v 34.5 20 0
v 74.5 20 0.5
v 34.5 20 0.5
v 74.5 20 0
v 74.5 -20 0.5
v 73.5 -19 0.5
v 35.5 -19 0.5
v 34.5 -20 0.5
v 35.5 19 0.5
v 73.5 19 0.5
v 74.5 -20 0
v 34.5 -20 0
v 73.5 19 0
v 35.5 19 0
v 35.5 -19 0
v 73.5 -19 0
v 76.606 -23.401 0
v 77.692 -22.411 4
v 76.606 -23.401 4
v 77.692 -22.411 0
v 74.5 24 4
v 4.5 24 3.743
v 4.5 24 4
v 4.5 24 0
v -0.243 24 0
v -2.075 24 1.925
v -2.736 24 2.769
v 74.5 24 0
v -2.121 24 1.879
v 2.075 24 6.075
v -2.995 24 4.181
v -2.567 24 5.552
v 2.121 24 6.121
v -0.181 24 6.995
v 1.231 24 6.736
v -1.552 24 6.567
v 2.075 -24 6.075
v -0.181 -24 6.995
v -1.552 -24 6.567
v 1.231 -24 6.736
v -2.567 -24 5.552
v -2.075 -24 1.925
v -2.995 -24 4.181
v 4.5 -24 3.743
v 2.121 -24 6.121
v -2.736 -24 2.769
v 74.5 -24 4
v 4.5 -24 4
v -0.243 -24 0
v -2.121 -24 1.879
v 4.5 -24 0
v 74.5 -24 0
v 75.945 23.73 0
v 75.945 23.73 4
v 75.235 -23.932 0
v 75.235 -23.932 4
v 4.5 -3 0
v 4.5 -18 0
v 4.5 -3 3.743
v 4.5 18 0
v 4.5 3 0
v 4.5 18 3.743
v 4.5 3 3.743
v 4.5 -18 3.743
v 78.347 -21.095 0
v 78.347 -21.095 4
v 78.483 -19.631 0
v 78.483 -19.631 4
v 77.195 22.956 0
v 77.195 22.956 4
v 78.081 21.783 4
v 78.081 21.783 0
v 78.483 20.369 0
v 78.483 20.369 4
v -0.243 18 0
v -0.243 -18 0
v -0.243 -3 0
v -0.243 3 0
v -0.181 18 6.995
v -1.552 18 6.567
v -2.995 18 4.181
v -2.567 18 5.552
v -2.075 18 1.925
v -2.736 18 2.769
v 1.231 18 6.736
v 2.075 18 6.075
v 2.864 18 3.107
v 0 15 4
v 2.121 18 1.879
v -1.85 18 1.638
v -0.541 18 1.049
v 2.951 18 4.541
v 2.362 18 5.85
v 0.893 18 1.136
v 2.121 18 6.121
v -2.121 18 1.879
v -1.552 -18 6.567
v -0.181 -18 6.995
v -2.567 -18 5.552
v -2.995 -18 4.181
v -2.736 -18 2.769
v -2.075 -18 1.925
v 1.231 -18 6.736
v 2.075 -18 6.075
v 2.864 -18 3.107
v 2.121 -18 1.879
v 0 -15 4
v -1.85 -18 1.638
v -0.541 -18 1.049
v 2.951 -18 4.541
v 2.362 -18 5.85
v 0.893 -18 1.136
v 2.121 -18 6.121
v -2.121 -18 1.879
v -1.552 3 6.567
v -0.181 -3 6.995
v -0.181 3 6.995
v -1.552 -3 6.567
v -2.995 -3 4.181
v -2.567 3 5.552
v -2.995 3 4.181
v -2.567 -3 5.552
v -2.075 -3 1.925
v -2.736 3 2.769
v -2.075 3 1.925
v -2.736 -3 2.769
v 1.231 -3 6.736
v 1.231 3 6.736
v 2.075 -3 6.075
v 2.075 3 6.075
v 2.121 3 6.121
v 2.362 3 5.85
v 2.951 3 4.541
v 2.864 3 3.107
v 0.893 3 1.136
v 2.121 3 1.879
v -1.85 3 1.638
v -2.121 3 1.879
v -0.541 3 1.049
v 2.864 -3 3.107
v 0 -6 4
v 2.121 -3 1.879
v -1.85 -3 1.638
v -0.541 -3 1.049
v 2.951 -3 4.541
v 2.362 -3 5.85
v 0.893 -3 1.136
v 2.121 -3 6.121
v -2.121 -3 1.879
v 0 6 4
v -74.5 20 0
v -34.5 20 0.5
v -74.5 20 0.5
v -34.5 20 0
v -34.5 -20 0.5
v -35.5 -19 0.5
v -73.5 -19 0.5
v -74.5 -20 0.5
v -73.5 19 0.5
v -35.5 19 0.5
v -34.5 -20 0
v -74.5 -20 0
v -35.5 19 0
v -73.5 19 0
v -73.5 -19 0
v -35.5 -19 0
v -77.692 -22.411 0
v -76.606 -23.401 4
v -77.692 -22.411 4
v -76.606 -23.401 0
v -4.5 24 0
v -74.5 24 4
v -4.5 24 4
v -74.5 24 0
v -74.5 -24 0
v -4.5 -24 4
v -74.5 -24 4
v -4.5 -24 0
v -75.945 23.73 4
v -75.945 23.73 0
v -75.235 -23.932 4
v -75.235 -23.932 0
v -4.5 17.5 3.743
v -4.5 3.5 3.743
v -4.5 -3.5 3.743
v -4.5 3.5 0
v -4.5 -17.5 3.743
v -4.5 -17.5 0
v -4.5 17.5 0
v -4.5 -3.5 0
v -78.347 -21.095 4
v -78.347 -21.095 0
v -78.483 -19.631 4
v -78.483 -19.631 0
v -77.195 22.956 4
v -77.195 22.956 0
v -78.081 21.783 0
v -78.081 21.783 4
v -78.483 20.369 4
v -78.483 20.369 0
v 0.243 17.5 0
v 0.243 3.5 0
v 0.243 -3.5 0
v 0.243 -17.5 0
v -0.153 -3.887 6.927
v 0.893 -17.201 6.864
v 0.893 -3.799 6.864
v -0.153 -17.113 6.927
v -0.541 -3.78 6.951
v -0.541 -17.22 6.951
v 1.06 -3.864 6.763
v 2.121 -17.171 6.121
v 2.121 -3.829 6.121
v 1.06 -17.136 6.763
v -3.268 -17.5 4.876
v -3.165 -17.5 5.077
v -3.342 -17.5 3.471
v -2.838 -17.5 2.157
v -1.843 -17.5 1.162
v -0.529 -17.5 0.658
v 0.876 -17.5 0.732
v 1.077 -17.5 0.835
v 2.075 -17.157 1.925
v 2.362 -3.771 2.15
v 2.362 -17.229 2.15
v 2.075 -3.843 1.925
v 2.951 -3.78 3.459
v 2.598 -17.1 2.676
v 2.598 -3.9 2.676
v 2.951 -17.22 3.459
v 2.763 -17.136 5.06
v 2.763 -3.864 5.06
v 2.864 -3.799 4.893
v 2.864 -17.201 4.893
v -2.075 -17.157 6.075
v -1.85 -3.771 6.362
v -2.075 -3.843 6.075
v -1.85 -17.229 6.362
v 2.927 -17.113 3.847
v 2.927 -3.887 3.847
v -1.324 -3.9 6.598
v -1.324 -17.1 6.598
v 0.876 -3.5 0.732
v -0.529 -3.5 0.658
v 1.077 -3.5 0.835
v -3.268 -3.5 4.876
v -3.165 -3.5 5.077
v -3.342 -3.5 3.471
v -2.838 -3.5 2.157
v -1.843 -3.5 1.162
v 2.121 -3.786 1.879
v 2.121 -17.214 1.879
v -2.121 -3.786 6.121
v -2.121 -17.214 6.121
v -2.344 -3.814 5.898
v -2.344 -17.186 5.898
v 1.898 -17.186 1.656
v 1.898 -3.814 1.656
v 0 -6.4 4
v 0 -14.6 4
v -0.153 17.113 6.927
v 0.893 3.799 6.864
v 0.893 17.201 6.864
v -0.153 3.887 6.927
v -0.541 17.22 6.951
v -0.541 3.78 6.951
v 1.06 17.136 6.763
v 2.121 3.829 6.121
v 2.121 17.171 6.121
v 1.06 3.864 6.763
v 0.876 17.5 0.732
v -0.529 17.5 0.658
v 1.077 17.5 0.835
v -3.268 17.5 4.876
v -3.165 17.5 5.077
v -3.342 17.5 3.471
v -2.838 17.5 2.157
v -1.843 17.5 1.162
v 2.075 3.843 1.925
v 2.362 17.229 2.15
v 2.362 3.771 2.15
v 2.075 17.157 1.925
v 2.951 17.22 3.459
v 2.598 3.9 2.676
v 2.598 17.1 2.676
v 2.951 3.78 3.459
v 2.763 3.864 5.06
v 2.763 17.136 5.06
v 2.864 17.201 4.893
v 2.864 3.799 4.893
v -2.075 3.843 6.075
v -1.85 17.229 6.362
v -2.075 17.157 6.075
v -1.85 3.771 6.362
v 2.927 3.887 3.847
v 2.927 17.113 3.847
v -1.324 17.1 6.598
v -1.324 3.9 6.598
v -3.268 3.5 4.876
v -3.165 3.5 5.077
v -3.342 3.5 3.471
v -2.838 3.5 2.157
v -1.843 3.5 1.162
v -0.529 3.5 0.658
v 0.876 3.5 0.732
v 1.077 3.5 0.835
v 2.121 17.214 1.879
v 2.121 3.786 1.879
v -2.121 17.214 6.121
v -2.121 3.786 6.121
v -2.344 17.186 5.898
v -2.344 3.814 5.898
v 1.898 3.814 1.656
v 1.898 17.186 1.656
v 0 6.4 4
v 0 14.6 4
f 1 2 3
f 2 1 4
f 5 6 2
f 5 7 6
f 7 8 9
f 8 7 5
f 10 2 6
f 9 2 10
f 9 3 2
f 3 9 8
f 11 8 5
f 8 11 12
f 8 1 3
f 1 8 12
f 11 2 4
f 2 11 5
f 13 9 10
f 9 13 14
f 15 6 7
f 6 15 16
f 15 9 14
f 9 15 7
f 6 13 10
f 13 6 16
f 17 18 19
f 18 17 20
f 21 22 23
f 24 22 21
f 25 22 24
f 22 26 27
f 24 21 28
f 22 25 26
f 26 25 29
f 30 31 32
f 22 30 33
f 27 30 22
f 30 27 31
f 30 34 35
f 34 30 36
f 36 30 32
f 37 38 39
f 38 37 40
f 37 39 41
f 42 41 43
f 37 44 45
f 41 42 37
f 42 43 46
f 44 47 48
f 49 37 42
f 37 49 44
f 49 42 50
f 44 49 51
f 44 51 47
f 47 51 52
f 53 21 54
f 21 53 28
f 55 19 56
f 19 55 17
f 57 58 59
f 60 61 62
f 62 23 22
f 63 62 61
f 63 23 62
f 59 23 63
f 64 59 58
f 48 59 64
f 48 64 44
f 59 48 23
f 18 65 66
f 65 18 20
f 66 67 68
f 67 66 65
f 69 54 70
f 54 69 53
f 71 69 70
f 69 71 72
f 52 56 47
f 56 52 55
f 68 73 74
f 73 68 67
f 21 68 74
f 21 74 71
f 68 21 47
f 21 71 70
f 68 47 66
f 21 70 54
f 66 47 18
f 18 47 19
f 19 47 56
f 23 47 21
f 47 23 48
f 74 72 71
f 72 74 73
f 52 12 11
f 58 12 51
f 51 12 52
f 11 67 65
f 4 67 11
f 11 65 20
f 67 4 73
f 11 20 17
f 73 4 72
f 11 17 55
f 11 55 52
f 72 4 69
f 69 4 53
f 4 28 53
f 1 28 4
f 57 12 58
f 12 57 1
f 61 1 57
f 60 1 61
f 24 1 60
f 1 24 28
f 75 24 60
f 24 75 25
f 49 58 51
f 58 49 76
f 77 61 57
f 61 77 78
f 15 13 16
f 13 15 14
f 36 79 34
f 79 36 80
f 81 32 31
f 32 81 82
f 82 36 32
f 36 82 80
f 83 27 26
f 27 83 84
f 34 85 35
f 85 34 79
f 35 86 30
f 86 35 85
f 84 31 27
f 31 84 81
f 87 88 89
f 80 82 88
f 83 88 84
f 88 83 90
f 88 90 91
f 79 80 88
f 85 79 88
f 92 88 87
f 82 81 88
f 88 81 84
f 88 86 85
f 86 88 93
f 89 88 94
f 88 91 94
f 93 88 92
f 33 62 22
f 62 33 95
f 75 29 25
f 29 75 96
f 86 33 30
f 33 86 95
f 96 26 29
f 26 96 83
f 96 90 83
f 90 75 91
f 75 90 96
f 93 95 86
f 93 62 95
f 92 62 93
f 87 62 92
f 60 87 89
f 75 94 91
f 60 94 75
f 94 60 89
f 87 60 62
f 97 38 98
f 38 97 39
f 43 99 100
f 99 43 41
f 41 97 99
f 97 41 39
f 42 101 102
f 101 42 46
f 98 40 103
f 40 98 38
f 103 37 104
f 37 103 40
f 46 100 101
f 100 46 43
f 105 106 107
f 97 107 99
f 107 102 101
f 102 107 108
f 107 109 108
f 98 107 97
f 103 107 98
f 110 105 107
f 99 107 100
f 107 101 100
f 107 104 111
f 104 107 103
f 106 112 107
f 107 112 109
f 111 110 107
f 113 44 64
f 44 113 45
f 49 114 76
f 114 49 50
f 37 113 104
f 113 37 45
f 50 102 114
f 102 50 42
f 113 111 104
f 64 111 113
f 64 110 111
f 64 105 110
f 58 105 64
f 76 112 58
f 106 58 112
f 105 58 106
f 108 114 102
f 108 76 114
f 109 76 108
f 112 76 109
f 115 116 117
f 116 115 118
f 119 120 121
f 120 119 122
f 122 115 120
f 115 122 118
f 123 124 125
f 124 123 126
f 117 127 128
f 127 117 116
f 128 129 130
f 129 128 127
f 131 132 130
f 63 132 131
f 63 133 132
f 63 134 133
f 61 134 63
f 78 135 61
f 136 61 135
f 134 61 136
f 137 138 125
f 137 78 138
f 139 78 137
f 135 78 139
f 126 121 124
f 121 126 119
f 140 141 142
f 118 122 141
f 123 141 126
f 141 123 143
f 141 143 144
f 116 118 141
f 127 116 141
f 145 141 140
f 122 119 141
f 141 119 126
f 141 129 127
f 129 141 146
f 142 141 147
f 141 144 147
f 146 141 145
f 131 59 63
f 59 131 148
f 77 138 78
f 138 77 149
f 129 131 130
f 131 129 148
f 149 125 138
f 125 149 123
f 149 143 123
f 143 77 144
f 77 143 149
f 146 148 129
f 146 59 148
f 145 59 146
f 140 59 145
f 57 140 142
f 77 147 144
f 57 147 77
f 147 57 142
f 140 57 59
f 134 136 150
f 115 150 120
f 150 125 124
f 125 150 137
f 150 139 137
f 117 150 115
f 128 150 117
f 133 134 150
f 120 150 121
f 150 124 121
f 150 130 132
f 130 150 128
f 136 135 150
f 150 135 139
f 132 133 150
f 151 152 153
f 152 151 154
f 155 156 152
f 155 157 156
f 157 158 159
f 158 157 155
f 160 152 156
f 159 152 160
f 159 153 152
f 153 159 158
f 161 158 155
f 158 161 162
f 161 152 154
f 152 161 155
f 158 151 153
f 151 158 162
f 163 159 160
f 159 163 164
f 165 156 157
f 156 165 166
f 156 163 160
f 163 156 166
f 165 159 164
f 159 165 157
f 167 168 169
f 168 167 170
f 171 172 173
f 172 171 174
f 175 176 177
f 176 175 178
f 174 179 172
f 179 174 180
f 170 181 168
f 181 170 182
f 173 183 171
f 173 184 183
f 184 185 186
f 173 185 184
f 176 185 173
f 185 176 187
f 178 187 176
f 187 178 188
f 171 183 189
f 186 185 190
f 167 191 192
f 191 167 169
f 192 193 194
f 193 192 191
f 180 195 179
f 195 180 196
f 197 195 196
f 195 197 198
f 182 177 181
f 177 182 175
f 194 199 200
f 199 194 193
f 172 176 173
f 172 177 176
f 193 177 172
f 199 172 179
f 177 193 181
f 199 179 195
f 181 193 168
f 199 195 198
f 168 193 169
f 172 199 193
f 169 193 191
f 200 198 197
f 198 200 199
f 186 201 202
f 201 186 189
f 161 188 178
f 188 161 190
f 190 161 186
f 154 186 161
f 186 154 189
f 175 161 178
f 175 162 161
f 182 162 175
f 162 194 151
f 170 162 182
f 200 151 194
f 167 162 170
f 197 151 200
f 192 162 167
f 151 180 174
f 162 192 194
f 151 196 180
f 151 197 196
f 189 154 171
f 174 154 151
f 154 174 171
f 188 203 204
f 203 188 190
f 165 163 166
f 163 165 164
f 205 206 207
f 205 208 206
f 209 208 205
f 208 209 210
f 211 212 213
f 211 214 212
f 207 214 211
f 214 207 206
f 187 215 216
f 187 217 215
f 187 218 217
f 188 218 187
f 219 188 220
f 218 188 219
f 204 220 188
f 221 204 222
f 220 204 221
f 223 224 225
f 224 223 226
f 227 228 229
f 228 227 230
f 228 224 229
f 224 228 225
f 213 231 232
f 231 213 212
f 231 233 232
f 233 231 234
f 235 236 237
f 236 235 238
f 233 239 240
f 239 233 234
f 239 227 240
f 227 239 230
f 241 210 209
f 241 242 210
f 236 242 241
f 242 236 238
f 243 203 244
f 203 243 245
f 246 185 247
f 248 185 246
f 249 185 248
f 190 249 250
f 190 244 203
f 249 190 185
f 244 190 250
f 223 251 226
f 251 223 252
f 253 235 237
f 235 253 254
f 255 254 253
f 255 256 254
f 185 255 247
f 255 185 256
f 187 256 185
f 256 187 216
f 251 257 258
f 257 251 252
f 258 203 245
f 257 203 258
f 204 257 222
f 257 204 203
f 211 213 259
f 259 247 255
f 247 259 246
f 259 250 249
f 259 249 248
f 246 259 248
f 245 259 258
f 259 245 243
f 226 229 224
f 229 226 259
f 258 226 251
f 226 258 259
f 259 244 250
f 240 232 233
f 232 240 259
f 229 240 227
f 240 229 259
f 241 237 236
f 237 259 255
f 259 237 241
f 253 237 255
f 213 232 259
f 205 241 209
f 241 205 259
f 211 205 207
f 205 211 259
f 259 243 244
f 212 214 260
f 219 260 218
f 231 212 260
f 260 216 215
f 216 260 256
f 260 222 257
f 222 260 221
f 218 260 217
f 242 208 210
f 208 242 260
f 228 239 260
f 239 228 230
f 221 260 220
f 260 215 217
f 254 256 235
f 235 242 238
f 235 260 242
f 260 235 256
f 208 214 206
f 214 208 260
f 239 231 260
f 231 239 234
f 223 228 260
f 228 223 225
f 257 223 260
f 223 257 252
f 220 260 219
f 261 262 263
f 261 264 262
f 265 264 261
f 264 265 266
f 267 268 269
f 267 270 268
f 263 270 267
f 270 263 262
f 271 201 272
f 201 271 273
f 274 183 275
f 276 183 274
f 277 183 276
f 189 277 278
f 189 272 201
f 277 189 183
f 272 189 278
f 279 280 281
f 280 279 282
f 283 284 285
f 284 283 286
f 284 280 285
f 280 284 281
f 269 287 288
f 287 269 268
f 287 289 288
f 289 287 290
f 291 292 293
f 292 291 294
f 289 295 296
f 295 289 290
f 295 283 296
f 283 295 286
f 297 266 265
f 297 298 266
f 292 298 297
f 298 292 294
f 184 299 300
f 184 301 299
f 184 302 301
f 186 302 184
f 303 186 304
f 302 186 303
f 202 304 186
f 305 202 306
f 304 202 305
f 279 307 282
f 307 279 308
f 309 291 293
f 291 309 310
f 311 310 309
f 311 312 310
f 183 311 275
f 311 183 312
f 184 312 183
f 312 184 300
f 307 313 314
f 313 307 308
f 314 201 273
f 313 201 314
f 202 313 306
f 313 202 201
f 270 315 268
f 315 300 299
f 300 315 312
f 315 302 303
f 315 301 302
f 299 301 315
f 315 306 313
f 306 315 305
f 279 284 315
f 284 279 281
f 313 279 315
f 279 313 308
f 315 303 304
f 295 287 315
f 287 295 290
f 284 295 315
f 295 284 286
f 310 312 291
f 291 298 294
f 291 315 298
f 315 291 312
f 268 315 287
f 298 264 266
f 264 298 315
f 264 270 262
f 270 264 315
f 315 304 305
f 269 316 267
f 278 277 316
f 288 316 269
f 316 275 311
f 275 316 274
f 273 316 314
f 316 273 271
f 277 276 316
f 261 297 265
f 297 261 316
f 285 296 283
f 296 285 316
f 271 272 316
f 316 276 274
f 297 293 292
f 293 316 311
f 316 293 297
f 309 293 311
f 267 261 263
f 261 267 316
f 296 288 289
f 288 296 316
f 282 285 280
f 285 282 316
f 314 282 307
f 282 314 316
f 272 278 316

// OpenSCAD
// preview[view:south, tilt:top]

/* [Global] */

// Load a 150x150 pixel image.(images will be stretched to fit) Simple, high contrast images work best. Make sure to click the Invert Colors checkbox!
image_file = "smile.dat"; // [image_surface:150x150]

// Where would you like the hinge in relation to your image?
hinge_placement = 1; // [1:top,2:left,3:bottom,4:right]

// What height would you like for the embossed area (mm)?
emboss_height = 1.5;

// How thick should the handle be (mm)?
handle_thickness = 2.5;

// How long should the handle be (mm, not less than 45)?
handle_length = 70;

/* [Hidden] */
$fa = 6;
$fs = 1.5;
image_width = 40;
image_length = 40;
image_padding = 4;

handle_width = image_width + image_padding*2;
handle_height = emboss_height+handle_thickness;
nub = 3; // hinge size
tol = 0.5; // spacing between hinge pieces

assembly();

module assembly() {
    stamp_top(90*hinge_placement);
    stamp_bottom(90*hinge_placement);   
}

module stamp_top(rot=90) {
    translate([1,0,0])
    union() {
        difference () {
            translate([handle_length + nub + tol, -handle_width/2, 0])
                rotate([0,0,90]) handle();
            translate([handle_length-image_length/2+nub+tol,0,handle_height]) 
                rotate([0,180,rot]) plate();
        }
    
        // hinge
        translate([-1,handle_width/2-2*nub,handle_height]) hinge_m();
        mirror([0,1,0]) translate([-1,handle_width/2-2*nub,handle_height]) hinge_m();
        translate([-1,-nub,handle_height]) hinge_m();
        mirror([0,1,0]) translate([-1,-nub,handle_height]) hinge_m();
    }
}

module stamp_bottom(rot=90) {
    translate([-1,0,0])
    union() {
        translate([-handle_length + image_length/2-nub-tol,0,handle_height]) 
            rotate([0,0,-rot]) plate();
        mirror([1,0,0]) translate([handle_length + nub + tol, -handle_width/2, 0]) 
            rotate([0,0,90]) handle();
        
        // hinge
        translate([1,-nub-tol,handle_height]) hinge_f();
        mirror([0,1,0]) translate([1,-nub-tol,handle_height]) hinge_f();
    }
}

module handle() {
    difference() {
        hull() {
            cube([handle_width, handle_length, handle_height]);
            translate([image_padding,0,0]) cylinder(r=image_padding, h=handle_height);
            translate([handle_width-image_padding,0,0]) cylinder(r=image_padding, h=handle_height);
        }
        guide();
    }

}

module guide() {
    translate([image_padding,0,-.5]) 
    difference() {
        cube([image_width, image_length, 1]);
        translate([1,1,-0.5]) cube([image_width-2, image_length-2, 2]);
    }
}

module hinge_m() {
    difference () {
    	rotate([0,45,0]) union(){
            translate([0,0,-nub]) cube ([nub*3,nub*2, nub*2]);
            rotate([90,0,0]) {
                translate([0,0,-2*nub]) cylinder(r=nub,h=2*nub);
    		    cylinder(r1=nub,r2=0,h=nub);
            }
    	}
        translate([-nub,-nub/2,-handle_height-nub*5]) cube([nub*5, nub*3, nub*5]);
    }
}

module hinge_f() {
    len = handle_width/2 - 3*nub - 2*tol;
    
    difference() {
        rotate([90,-45,0]) 
        difference() {
            union() {
                cylinder(r=nub, h=len);
                translate([-3*nub,-nub,0]) cube([nub*3,nub*2,len]);
            }
            translate([0,0,-0.1]) cylinder(r1=nub+tol,r2=0,h=nub);
            translate([0,0,len-nub+0.1]) cylinder(r1=0,r2=nub+tol,h=nub);
        }
        translate([-nub*4,-len-nub/2,-handle_height-nub*5]) cube([nub*5, len+nub, nub*5]);
    }
}

module plate() {
    scale([(image_width)/150,(image_length)/150,emboss_height])
        surface(file=image_file, center=true, convexity=5);
}
